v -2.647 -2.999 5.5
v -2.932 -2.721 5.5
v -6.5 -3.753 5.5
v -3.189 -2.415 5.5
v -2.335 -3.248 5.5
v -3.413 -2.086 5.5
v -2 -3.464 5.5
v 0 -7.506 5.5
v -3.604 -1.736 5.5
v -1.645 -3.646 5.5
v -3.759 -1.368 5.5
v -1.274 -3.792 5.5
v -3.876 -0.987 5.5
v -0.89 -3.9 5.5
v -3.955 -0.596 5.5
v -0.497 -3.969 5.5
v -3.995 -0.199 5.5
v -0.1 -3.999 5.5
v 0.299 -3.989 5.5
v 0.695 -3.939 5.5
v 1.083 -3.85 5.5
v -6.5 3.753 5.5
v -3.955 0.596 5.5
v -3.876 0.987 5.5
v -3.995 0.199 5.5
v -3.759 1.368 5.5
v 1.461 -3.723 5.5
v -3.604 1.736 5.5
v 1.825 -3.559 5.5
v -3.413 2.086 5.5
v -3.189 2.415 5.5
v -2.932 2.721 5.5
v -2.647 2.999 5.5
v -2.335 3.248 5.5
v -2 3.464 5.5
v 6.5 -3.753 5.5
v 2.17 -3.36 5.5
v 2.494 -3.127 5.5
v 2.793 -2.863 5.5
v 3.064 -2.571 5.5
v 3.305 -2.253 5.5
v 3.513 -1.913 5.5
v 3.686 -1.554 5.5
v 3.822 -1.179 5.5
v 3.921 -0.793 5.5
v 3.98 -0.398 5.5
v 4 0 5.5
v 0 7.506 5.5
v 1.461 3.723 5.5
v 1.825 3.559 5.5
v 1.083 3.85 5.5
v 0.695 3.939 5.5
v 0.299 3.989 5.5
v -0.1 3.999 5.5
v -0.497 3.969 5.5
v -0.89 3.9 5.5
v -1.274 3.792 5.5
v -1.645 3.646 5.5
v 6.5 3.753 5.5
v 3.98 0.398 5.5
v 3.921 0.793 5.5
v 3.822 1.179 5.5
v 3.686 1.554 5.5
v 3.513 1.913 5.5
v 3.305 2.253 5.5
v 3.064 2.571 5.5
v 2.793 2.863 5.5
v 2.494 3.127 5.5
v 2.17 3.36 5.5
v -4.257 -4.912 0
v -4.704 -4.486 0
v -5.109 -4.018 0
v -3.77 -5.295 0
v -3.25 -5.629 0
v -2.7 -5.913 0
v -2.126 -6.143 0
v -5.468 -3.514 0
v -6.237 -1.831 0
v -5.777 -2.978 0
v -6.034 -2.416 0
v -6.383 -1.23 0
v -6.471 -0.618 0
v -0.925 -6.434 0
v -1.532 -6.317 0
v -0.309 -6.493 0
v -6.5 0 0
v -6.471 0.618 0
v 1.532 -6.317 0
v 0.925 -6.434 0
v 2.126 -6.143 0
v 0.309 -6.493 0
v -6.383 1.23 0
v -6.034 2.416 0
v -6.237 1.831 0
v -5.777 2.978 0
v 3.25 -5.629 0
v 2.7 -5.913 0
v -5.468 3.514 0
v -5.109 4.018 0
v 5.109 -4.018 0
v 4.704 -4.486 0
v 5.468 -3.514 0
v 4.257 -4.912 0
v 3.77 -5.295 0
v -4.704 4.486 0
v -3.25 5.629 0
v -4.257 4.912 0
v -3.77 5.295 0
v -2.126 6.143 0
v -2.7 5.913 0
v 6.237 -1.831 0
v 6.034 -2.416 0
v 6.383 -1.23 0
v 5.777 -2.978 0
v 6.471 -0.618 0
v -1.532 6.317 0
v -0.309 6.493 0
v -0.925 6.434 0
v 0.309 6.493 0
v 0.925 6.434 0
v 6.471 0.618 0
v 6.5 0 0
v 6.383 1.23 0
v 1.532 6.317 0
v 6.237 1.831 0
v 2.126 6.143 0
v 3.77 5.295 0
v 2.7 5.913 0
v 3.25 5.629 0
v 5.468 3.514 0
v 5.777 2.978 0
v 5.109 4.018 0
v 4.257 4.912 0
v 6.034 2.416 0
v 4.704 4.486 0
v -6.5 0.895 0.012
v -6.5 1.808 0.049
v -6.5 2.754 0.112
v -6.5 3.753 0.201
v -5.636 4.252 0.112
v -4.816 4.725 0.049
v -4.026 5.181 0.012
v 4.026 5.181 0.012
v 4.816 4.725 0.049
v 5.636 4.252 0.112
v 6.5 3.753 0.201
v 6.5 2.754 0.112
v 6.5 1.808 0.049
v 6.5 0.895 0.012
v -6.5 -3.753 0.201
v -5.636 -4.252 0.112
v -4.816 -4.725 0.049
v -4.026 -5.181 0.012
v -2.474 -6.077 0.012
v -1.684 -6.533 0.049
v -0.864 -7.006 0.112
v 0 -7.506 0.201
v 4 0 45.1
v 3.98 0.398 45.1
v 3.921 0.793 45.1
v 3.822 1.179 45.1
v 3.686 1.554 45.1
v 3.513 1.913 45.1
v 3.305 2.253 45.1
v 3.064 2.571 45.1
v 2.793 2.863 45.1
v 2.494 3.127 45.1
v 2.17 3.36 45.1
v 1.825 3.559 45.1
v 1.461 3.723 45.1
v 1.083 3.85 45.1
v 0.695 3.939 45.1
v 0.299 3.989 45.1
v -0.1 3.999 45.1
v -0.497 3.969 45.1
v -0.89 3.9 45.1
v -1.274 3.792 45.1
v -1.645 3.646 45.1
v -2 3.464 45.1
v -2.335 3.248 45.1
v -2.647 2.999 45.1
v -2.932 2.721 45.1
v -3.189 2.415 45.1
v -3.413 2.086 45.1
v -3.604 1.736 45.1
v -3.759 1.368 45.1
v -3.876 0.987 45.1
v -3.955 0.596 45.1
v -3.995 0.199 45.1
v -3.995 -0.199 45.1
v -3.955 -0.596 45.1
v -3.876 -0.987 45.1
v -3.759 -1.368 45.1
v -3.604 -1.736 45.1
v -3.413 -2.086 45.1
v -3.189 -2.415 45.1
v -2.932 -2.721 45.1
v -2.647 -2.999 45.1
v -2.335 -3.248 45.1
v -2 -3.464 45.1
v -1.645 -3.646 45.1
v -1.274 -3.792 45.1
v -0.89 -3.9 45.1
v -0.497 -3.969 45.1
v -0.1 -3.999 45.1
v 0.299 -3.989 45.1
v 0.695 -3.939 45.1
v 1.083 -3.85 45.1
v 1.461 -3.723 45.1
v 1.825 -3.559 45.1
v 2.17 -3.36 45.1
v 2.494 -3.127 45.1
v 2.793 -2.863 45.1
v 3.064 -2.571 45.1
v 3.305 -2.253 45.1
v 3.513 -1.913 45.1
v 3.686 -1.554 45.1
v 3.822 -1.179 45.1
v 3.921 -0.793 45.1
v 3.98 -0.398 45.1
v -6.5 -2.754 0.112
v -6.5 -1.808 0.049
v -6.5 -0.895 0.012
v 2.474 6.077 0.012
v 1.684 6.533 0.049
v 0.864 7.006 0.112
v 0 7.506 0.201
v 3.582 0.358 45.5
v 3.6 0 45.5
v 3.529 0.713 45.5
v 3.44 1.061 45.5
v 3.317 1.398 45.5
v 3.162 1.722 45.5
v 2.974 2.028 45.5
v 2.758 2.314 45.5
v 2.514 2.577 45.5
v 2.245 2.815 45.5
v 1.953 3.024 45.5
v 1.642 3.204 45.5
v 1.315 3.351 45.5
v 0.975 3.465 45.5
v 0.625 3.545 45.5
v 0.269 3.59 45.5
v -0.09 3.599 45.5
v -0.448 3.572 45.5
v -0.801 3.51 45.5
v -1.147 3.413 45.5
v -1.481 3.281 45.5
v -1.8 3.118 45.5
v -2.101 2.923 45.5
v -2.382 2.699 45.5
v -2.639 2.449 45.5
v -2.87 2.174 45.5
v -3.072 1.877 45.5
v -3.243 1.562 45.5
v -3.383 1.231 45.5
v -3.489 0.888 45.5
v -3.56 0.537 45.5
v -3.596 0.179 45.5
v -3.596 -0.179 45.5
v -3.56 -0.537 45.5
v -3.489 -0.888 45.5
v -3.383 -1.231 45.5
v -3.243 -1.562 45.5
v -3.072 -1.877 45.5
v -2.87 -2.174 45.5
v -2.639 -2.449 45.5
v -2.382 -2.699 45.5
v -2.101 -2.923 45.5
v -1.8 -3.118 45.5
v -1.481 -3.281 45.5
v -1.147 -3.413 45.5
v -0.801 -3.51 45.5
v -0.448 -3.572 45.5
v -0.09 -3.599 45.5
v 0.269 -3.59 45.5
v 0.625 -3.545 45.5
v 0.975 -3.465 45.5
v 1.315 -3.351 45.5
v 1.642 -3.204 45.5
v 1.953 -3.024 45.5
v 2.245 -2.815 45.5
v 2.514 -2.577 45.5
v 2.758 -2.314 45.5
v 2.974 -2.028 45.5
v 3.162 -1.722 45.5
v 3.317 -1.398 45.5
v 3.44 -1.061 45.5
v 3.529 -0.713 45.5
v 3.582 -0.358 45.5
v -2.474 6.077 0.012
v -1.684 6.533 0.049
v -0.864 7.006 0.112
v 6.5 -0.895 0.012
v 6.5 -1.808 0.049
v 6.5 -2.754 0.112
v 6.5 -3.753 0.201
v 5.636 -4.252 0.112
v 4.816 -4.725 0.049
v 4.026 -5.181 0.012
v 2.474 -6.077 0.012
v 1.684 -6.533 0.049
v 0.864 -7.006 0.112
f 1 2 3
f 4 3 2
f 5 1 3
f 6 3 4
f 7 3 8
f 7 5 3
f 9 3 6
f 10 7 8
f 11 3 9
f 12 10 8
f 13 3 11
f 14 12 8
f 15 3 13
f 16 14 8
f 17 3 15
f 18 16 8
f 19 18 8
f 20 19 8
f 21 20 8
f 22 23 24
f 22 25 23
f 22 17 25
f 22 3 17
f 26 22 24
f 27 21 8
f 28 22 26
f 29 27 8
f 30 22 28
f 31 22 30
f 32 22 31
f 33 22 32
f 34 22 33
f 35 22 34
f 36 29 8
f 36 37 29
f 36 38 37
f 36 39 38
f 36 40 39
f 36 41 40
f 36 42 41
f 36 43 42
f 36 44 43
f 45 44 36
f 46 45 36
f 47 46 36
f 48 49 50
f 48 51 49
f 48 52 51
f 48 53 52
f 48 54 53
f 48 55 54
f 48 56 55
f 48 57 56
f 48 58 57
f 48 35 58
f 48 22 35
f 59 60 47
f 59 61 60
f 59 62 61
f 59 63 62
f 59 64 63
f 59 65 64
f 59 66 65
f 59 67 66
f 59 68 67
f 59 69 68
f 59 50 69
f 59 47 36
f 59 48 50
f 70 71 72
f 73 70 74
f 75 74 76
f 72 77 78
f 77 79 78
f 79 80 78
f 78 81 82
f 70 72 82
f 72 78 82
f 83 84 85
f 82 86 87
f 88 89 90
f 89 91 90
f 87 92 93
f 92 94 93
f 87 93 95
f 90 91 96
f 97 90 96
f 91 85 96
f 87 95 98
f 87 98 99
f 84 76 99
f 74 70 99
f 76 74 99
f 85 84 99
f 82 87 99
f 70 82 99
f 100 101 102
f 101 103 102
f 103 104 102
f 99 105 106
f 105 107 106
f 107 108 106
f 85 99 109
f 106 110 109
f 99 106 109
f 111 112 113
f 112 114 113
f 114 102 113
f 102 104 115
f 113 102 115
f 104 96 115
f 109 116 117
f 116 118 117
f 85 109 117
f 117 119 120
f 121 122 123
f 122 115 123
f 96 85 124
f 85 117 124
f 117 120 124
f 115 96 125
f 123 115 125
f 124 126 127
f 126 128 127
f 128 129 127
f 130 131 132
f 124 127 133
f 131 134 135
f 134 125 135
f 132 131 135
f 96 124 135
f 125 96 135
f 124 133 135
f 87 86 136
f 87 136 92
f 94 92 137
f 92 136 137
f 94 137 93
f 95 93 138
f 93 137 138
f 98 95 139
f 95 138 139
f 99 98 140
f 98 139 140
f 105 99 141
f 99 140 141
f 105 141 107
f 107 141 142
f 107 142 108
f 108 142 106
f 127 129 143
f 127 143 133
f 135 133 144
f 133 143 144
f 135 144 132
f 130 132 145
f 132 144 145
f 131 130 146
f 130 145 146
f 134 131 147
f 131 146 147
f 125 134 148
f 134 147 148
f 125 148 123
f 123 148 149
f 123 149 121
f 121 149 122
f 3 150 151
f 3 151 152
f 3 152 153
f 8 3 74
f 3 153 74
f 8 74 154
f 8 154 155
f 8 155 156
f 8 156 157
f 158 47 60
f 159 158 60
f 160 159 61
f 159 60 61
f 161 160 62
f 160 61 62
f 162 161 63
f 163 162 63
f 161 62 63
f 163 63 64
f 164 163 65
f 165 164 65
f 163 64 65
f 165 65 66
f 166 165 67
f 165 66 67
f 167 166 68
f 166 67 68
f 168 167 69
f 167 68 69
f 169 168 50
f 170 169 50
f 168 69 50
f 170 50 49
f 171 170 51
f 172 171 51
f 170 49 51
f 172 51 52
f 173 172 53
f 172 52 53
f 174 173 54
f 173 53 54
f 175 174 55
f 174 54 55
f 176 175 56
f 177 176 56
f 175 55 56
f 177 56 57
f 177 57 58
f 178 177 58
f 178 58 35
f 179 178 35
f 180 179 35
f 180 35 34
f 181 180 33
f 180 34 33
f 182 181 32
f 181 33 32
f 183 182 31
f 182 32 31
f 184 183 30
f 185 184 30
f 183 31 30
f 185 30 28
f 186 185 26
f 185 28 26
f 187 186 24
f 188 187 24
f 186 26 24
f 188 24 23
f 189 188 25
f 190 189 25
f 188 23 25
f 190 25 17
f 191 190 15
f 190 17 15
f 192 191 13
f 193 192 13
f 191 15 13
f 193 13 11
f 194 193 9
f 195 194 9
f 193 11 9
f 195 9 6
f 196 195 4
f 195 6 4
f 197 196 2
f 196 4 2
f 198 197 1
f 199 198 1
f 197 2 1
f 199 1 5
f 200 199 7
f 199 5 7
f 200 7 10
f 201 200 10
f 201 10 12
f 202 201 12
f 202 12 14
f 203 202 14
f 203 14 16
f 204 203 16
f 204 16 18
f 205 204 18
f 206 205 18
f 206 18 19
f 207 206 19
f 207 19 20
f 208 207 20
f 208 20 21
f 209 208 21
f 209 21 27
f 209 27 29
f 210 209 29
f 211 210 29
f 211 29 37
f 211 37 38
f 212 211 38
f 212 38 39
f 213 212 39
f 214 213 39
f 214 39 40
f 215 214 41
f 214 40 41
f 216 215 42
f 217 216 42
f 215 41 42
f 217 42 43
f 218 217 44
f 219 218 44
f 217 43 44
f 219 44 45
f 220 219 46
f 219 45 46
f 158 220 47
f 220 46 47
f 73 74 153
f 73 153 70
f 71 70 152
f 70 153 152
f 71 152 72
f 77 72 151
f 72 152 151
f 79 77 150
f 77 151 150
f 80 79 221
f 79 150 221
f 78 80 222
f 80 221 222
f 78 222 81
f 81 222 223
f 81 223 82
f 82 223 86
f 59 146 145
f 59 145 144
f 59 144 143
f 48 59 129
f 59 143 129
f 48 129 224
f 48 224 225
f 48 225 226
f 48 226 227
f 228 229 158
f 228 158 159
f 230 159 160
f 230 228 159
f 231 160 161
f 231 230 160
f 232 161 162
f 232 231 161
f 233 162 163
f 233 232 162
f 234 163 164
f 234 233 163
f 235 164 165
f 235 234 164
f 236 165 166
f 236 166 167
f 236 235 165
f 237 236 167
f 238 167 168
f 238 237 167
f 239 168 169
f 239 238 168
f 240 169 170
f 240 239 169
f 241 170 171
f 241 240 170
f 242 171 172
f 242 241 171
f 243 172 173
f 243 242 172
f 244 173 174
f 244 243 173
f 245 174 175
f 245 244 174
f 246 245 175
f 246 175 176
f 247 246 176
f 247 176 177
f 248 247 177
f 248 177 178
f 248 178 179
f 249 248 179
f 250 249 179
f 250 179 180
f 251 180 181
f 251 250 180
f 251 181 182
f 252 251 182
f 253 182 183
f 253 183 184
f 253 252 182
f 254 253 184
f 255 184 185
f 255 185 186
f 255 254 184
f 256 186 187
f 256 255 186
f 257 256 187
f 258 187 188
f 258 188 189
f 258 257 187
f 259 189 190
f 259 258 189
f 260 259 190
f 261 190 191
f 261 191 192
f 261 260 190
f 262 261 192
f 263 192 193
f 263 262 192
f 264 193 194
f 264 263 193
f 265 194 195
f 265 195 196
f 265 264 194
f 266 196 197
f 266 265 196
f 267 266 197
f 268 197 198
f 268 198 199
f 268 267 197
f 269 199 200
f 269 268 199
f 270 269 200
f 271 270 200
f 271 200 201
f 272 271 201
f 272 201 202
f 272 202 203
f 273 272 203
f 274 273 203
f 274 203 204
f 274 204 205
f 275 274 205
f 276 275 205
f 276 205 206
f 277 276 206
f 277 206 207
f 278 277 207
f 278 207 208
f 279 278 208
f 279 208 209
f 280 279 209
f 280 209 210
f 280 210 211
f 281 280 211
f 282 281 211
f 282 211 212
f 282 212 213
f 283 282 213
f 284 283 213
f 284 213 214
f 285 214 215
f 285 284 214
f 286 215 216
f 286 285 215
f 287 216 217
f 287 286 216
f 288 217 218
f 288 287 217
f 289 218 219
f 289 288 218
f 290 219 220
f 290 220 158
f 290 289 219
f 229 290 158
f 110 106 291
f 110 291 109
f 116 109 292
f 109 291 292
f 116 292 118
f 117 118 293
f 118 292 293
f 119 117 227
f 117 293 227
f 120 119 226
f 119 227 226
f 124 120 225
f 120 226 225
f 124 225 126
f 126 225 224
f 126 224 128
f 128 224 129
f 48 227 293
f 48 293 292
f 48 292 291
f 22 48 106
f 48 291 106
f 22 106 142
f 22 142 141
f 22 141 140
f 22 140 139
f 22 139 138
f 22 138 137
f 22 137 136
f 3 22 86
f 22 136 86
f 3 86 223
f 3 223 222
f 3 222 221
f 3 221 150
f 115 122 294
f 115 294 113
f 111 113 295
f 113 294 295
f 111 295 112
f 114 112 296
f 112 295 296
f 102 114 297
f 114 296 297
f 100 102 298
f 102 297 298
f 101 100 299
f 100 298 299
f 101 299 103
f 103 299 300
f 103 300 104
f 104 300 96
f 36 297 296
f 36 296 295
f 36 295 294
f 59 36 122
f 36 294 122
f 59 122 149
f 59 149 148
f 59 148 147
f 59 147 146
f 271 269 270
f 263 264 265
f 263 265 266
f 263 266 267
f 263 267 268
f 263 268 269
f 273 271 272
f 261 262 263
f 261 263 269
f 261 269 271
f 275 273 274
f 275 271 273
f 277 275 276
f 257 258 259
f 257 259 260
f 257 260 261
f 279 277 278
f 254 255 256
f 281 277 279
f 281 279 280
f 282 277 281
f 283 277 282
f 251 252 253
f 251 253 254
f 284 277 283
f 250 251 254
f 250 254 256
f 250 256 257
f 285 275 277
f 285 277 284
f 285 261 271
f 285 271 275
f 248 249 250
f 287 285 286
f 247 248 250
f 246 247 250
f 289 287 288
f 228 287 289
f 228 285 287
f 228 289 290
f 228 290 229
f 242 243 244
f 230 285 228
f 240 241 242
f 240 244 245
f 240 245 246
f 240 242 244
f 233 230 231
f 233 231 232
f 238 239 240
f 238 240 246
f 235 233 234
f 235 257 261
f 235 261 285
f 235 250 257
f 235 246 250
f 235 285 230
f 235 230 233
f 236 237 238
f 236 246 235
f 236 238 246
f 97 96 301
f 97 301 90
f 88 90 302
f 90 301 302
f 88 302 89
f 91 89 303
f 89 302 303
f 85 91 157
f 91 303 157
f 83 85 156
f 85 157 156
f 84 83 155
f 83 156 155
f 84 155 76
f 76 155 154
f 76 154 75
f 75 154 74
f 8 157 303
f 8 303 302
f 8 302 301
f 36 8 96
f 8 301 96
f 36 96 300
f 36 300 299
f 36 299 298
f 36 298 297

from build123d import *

# Parameters (mm, degrees)
F1_DEPTH = 5.5
F2_R     = 4
F3_DEPTH = 40
F4_SIZE  = 0.4


with BuildPart() as f1:
    # F0 (on Top) → F1 (new body)
    with BuildSketch(Plane.XY):
        Polygon((6.5, 3.752777), (0, 7.505553), (-6.5, 3.752777), (-6.5, -3.752777), (0, -7.505553), (6.5, -3.752777), align=None)
    extrude(amount=F1_DEPTH)

    # F2 (on face) → F3 (join)
    with BuildSketch(Plane.XY.offset(5.5)):
        Circle(F2_R)
    extrude(amount=F3_DEPTH)

    # F4
    f4_edges = [f1.edges().sort_by_distance(p)[0] for p in [
        (-4, 0, 45.5),
    ]]
    chamfer(f4_edges, length=F4_SIZE)

    # F5 (on Front) → F6 (revolve, cut)
    with BuildSketch(Plane.XZ):
        Polygon((-11.5, 1), (-11.5, 0), (-6.5, 0), align=None)
    revolve(axis=Axis((0, 0, 5.5), (0, 0, -1)), mode=Mode.SUBTRACT)


solid = f1.part
